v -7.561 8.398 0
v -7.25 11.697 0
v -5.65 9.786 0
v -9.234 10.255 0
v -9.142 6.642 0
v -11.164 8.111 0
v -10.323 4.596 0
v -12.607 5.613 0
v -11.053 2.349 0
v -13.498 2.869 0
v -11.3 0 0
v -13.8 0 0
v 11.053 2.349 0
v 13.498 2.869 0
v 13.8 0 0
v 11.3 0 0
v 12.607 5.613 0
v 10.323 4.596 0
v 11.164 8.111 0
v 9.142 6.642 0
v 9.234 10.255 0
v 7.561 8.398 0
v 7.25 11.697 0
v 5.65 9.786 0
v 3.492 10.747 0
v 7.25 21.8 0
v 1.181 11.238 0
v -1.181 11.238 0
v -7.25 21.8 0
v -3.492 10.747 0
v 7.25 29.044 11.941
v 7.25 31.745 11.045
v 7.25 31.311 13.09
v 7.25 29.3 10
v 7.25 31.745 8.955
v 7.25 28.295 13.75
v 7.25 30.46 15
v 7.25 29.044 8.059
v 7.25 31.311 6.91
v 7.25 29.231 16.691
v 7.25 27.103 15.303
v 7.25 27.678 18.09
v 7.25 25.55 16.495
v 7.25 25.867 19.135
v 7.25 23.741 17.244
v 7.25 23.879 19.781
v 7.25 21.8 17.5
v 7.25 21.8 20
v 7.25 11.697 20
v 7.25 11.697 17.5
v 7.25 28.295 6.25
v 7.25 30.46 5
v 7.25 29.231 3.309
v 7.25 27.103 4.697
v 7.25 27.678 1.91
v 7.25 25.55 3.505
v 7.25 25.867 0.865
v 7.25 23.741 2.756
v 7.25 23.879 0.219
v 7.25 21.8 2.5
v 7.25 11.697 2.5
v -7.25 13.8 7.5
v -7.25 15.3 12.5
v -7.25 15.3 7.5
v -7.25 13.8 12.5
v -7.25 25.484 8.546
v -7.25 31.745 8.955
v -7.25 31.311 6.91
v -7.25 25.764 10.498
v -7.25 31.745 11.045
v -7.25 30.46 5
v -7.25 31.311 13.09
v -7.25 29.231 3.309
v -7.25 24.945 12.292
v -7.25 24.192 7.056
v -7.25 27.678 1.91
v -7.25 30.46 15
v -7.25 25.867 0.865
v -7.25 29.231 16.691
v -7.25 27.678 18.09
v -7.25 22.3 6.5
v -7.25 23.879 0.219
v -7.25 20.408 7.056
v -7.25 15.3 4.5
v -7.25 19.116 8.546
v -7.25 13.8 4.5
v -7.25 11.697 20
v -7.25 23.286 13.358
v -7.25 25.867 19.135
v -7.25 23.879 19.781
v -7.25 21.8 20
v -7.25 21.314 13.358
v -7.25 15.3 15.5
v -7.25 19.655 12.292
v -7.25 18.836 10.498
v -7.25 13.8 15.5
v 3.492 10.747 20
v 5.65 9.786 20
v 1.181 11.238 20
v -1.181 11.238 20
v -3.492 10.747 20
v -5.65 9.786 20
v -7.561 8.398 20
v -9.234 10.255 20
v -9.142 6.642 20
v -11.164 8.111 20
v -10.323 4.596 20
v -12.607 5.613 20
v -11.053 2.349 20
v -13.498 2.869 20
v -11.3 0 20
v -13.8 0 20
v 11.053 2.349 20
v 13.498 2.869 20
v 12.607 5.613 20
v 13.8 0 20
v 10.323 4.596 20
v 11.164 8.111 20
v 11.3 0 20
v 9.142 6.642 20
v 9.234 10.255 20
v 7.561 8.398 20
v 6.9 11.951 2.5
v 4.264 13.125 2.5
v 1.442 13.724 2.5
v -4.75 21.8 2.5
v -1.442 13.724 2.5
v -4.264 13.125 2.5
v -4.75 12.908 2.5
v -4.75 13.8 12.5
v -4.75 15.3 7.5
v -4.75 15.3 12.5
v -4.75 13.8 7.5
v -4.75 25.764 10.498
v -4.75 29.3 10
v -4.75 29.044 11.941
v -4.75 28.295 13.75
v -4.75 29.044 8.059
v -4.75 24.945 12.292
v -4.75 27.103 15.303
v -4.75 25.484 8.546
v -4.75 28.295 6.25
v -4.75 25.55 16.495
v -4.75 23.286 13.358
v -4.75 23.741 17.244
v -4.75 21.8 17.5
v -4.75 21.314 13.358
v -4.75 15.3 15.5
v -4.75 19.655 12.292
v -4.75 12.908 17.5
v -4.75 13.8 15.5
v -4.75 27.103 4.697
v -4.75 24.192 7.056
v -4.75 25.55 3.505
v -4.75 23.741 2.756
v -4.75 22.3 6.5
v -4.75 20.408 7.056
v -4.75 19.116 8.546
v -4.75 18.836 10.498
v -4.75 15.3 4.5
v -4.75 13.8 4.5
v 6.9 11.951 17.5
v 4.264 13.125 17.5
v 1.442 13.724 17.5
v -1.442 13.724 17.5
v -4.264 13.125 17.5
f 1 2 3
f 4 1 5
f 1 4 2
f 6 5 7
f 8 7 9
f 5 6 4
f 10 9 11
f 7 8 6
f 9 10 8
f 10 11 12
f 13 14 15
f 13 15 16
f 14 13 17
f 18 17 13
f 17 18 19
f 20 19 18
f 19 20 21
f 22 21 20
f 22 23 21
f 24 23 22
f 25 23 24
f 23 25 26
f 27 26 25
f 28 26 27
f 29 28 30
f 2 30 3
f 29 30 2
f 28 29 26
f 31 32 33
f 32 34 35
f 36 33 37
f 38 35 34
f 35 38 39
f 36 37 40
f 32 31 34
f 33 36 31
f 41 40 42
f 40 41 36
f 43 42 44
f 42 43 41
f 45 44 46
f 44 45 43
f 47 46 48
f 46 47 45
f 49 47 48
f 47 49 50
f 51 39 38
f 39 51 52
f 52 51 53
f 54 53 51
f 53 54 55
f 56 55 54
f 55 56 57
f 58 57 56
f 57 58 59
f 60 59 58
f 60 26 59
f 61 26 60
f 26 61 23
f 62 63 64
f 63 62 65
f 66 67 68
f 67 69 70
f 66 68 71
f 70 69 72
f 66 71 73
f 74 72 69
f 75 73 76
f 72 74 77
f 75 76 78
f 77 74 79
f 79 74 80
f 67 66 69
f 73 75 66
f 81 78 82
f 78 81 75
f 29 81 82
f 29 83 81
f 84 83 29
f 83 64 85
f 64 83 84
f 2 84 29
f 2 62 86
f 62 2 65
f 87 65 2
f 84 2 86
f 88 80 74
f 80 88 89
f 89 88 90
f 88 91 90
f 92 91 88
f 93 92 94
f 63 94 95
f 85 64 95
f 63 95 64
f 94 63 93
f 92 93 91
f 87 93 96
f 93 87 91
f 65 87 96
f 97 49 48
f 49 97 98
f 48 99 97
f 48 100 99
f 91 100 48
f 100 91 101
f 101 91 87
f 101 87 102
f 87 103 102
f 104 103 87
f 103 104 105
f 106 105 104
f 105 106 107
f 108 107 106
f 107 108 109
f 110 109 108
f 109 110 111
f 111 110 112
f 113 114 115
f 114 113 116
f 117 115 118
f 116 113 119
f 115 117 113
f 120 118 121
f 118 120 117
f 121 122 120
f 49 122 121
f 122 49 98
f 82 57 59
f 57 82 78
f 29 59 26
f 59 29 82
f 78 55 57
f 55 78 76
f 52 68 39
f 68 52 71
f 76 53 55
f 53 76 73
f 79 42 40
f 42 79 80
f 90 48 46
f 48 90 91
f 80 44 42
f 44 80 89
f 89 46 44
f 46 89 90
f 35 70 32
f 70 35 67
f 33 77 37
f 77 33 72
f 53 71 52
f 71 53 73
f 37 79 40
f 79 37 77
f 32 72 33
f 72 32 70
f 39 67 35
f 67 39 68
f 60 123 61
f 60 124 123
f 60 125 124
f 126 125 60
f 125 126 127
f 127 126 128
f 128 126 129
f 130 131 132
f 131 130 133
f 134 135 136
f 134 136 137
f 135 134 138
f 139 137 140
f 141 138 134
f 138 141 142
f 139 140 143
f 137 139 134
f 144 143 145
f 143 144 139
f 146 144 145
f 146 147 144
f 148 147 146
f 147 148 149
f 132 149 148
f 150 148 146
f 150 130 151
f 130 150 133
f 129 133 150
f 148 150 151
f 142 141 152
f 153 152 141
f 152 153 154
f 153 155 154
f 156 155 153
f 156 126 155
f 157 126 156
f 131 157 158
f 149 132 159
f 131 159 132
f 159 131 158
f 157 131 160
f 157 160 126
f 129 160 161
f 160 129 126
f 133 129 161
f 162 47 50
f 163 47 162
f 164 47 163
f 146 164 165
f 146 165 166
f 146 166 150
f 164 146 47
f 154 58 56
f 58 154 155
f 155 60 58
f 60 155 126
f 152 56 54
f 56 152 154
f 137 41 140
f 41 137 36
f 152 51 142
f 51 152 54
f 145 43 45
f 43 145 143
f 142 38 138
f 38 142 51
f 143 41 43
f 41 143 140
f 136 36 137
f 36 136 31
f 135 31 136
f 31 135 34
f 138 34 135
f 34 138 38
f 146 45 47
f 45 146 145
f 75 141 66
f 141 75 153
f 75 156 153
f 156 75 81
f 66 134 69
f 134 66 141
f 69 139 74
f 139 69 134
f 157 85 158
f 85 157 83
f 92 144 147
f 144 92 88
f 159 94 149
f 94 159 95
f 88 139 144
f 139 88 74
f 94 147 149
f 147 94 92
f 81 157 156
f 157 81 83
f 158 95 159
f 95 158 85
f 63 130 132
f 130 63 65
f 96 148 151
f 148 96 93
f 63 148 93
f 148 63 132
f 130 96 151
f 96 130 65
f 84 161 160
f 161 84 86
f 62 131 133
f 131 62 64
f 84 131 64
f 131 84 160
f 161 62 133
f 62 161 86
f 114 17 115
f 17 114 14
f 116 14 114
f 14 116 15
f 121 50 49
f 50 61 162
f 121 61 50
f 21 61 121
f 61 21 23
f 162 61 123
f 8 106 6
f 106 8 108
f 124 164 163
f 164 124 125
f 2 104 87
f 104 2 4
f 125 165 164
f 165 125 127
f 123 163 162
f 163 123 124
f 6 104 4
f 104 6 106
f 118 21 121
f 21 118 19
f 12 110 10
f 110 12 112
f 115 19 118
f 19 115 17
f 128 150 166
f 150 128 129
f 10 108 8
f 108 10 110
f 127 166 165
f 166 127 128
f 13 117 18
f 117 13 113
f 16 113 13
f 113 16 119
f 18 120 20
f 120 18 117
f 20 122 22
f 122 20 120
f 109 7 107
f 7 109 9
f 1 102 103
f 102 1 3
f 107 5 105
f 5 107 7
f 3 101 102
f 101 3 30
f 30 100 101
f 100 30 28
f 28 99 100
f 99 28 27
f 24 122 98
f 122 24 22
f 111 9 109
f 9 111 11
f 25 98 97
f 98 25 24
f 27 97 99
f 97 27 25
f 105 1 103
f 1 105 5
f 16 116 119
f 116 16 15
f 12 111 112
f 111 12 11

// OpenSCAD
// Copyright 2018 Marcos Del Sol Vives
// SPDX-License-Identifier: ISC

// Tweak these parameters to your hearth's content

// Wall thickness
wallthickness = 2.5;

// Width of the support
width = 20;

// Diameter of the handlebar
handlediameter = 71 / PI;

// Height of the tab protecting the contacts of the button
tabwallheight = 12;

// Diameter of the hole for the button
buttondiameter = 7;

// Diameter of the nut holding the button in place
buttonnutdiameter = 14;

// Thickness of the zip tie
zipthickness = 1.5;

// Width of the zip tie
zipwidth = 3;

// Number of zip ties
zipcount = 2;

error = 0.01;

// END OF CONFIGURATION

module bevelsquare(width, length, height) {
    translate([-width / 2, 0, 0])
        cube([width, length - width / 2, height]);
    translate([0, length - width / 2, 0])
        cylinder(d=width, h=height);
}

module handletab(length) {
    intersection() {
        difference() {
            bevelsquare(width, length + wallthickness, wallthickness + tabwallheight);
            translate([0, 0, wallthickness])
                bevelsquare(width - 2 * wallthickness, length, tabwallheight);
        }
        
        translate([-width / 2, 0, 0]) {
            cube([width, length + wallthickness, wallthickness + tabwallheight]);
        }
    }
}

difference() {
    union() {
        cylinder(h=width, d=handlediameter + wallthickness * 2);

        translate([-tabwallheight / 2 - wallthickness / 2, 0, width / 2])
            rotate([0, 90, 0])
                difference() {
                    handletab(handlediameter / 2 + wallthickness + buttonnutdiameter + zipthickness);
                    
                    // Hole for the button
                    translate([0, buttonnutdiameter/2 + handlediameter / 2 + wallthickness + zipthickness, 0]) cylinder(d=buttondiameter, h=wallthickness);
                    
                    // One zip hole
                    translate([-width / 5 - zipwidth/2, handlediameter / 2 + wallthickness, 0]) {
                        cube([zipwidth, zipthickness, wallthickness]);
                    }
                    
                    translate([width / 5 - zipwidth/2, handlediameter / 2 + wallthickness, 0]) {
                        cube([zipwidth, zipthickness, wallthickness]);
                    }
            }
    }

    cylinder(h=width+error, d=handlediameter);
    
    translate([-handlediameter / 2 - wallthickness, -handlediameter / 2 - wallthickness, 0])
        cube([handlediameter + 2 * wallthickness, handlediameter / 2 + wallthickness, width]);

}
